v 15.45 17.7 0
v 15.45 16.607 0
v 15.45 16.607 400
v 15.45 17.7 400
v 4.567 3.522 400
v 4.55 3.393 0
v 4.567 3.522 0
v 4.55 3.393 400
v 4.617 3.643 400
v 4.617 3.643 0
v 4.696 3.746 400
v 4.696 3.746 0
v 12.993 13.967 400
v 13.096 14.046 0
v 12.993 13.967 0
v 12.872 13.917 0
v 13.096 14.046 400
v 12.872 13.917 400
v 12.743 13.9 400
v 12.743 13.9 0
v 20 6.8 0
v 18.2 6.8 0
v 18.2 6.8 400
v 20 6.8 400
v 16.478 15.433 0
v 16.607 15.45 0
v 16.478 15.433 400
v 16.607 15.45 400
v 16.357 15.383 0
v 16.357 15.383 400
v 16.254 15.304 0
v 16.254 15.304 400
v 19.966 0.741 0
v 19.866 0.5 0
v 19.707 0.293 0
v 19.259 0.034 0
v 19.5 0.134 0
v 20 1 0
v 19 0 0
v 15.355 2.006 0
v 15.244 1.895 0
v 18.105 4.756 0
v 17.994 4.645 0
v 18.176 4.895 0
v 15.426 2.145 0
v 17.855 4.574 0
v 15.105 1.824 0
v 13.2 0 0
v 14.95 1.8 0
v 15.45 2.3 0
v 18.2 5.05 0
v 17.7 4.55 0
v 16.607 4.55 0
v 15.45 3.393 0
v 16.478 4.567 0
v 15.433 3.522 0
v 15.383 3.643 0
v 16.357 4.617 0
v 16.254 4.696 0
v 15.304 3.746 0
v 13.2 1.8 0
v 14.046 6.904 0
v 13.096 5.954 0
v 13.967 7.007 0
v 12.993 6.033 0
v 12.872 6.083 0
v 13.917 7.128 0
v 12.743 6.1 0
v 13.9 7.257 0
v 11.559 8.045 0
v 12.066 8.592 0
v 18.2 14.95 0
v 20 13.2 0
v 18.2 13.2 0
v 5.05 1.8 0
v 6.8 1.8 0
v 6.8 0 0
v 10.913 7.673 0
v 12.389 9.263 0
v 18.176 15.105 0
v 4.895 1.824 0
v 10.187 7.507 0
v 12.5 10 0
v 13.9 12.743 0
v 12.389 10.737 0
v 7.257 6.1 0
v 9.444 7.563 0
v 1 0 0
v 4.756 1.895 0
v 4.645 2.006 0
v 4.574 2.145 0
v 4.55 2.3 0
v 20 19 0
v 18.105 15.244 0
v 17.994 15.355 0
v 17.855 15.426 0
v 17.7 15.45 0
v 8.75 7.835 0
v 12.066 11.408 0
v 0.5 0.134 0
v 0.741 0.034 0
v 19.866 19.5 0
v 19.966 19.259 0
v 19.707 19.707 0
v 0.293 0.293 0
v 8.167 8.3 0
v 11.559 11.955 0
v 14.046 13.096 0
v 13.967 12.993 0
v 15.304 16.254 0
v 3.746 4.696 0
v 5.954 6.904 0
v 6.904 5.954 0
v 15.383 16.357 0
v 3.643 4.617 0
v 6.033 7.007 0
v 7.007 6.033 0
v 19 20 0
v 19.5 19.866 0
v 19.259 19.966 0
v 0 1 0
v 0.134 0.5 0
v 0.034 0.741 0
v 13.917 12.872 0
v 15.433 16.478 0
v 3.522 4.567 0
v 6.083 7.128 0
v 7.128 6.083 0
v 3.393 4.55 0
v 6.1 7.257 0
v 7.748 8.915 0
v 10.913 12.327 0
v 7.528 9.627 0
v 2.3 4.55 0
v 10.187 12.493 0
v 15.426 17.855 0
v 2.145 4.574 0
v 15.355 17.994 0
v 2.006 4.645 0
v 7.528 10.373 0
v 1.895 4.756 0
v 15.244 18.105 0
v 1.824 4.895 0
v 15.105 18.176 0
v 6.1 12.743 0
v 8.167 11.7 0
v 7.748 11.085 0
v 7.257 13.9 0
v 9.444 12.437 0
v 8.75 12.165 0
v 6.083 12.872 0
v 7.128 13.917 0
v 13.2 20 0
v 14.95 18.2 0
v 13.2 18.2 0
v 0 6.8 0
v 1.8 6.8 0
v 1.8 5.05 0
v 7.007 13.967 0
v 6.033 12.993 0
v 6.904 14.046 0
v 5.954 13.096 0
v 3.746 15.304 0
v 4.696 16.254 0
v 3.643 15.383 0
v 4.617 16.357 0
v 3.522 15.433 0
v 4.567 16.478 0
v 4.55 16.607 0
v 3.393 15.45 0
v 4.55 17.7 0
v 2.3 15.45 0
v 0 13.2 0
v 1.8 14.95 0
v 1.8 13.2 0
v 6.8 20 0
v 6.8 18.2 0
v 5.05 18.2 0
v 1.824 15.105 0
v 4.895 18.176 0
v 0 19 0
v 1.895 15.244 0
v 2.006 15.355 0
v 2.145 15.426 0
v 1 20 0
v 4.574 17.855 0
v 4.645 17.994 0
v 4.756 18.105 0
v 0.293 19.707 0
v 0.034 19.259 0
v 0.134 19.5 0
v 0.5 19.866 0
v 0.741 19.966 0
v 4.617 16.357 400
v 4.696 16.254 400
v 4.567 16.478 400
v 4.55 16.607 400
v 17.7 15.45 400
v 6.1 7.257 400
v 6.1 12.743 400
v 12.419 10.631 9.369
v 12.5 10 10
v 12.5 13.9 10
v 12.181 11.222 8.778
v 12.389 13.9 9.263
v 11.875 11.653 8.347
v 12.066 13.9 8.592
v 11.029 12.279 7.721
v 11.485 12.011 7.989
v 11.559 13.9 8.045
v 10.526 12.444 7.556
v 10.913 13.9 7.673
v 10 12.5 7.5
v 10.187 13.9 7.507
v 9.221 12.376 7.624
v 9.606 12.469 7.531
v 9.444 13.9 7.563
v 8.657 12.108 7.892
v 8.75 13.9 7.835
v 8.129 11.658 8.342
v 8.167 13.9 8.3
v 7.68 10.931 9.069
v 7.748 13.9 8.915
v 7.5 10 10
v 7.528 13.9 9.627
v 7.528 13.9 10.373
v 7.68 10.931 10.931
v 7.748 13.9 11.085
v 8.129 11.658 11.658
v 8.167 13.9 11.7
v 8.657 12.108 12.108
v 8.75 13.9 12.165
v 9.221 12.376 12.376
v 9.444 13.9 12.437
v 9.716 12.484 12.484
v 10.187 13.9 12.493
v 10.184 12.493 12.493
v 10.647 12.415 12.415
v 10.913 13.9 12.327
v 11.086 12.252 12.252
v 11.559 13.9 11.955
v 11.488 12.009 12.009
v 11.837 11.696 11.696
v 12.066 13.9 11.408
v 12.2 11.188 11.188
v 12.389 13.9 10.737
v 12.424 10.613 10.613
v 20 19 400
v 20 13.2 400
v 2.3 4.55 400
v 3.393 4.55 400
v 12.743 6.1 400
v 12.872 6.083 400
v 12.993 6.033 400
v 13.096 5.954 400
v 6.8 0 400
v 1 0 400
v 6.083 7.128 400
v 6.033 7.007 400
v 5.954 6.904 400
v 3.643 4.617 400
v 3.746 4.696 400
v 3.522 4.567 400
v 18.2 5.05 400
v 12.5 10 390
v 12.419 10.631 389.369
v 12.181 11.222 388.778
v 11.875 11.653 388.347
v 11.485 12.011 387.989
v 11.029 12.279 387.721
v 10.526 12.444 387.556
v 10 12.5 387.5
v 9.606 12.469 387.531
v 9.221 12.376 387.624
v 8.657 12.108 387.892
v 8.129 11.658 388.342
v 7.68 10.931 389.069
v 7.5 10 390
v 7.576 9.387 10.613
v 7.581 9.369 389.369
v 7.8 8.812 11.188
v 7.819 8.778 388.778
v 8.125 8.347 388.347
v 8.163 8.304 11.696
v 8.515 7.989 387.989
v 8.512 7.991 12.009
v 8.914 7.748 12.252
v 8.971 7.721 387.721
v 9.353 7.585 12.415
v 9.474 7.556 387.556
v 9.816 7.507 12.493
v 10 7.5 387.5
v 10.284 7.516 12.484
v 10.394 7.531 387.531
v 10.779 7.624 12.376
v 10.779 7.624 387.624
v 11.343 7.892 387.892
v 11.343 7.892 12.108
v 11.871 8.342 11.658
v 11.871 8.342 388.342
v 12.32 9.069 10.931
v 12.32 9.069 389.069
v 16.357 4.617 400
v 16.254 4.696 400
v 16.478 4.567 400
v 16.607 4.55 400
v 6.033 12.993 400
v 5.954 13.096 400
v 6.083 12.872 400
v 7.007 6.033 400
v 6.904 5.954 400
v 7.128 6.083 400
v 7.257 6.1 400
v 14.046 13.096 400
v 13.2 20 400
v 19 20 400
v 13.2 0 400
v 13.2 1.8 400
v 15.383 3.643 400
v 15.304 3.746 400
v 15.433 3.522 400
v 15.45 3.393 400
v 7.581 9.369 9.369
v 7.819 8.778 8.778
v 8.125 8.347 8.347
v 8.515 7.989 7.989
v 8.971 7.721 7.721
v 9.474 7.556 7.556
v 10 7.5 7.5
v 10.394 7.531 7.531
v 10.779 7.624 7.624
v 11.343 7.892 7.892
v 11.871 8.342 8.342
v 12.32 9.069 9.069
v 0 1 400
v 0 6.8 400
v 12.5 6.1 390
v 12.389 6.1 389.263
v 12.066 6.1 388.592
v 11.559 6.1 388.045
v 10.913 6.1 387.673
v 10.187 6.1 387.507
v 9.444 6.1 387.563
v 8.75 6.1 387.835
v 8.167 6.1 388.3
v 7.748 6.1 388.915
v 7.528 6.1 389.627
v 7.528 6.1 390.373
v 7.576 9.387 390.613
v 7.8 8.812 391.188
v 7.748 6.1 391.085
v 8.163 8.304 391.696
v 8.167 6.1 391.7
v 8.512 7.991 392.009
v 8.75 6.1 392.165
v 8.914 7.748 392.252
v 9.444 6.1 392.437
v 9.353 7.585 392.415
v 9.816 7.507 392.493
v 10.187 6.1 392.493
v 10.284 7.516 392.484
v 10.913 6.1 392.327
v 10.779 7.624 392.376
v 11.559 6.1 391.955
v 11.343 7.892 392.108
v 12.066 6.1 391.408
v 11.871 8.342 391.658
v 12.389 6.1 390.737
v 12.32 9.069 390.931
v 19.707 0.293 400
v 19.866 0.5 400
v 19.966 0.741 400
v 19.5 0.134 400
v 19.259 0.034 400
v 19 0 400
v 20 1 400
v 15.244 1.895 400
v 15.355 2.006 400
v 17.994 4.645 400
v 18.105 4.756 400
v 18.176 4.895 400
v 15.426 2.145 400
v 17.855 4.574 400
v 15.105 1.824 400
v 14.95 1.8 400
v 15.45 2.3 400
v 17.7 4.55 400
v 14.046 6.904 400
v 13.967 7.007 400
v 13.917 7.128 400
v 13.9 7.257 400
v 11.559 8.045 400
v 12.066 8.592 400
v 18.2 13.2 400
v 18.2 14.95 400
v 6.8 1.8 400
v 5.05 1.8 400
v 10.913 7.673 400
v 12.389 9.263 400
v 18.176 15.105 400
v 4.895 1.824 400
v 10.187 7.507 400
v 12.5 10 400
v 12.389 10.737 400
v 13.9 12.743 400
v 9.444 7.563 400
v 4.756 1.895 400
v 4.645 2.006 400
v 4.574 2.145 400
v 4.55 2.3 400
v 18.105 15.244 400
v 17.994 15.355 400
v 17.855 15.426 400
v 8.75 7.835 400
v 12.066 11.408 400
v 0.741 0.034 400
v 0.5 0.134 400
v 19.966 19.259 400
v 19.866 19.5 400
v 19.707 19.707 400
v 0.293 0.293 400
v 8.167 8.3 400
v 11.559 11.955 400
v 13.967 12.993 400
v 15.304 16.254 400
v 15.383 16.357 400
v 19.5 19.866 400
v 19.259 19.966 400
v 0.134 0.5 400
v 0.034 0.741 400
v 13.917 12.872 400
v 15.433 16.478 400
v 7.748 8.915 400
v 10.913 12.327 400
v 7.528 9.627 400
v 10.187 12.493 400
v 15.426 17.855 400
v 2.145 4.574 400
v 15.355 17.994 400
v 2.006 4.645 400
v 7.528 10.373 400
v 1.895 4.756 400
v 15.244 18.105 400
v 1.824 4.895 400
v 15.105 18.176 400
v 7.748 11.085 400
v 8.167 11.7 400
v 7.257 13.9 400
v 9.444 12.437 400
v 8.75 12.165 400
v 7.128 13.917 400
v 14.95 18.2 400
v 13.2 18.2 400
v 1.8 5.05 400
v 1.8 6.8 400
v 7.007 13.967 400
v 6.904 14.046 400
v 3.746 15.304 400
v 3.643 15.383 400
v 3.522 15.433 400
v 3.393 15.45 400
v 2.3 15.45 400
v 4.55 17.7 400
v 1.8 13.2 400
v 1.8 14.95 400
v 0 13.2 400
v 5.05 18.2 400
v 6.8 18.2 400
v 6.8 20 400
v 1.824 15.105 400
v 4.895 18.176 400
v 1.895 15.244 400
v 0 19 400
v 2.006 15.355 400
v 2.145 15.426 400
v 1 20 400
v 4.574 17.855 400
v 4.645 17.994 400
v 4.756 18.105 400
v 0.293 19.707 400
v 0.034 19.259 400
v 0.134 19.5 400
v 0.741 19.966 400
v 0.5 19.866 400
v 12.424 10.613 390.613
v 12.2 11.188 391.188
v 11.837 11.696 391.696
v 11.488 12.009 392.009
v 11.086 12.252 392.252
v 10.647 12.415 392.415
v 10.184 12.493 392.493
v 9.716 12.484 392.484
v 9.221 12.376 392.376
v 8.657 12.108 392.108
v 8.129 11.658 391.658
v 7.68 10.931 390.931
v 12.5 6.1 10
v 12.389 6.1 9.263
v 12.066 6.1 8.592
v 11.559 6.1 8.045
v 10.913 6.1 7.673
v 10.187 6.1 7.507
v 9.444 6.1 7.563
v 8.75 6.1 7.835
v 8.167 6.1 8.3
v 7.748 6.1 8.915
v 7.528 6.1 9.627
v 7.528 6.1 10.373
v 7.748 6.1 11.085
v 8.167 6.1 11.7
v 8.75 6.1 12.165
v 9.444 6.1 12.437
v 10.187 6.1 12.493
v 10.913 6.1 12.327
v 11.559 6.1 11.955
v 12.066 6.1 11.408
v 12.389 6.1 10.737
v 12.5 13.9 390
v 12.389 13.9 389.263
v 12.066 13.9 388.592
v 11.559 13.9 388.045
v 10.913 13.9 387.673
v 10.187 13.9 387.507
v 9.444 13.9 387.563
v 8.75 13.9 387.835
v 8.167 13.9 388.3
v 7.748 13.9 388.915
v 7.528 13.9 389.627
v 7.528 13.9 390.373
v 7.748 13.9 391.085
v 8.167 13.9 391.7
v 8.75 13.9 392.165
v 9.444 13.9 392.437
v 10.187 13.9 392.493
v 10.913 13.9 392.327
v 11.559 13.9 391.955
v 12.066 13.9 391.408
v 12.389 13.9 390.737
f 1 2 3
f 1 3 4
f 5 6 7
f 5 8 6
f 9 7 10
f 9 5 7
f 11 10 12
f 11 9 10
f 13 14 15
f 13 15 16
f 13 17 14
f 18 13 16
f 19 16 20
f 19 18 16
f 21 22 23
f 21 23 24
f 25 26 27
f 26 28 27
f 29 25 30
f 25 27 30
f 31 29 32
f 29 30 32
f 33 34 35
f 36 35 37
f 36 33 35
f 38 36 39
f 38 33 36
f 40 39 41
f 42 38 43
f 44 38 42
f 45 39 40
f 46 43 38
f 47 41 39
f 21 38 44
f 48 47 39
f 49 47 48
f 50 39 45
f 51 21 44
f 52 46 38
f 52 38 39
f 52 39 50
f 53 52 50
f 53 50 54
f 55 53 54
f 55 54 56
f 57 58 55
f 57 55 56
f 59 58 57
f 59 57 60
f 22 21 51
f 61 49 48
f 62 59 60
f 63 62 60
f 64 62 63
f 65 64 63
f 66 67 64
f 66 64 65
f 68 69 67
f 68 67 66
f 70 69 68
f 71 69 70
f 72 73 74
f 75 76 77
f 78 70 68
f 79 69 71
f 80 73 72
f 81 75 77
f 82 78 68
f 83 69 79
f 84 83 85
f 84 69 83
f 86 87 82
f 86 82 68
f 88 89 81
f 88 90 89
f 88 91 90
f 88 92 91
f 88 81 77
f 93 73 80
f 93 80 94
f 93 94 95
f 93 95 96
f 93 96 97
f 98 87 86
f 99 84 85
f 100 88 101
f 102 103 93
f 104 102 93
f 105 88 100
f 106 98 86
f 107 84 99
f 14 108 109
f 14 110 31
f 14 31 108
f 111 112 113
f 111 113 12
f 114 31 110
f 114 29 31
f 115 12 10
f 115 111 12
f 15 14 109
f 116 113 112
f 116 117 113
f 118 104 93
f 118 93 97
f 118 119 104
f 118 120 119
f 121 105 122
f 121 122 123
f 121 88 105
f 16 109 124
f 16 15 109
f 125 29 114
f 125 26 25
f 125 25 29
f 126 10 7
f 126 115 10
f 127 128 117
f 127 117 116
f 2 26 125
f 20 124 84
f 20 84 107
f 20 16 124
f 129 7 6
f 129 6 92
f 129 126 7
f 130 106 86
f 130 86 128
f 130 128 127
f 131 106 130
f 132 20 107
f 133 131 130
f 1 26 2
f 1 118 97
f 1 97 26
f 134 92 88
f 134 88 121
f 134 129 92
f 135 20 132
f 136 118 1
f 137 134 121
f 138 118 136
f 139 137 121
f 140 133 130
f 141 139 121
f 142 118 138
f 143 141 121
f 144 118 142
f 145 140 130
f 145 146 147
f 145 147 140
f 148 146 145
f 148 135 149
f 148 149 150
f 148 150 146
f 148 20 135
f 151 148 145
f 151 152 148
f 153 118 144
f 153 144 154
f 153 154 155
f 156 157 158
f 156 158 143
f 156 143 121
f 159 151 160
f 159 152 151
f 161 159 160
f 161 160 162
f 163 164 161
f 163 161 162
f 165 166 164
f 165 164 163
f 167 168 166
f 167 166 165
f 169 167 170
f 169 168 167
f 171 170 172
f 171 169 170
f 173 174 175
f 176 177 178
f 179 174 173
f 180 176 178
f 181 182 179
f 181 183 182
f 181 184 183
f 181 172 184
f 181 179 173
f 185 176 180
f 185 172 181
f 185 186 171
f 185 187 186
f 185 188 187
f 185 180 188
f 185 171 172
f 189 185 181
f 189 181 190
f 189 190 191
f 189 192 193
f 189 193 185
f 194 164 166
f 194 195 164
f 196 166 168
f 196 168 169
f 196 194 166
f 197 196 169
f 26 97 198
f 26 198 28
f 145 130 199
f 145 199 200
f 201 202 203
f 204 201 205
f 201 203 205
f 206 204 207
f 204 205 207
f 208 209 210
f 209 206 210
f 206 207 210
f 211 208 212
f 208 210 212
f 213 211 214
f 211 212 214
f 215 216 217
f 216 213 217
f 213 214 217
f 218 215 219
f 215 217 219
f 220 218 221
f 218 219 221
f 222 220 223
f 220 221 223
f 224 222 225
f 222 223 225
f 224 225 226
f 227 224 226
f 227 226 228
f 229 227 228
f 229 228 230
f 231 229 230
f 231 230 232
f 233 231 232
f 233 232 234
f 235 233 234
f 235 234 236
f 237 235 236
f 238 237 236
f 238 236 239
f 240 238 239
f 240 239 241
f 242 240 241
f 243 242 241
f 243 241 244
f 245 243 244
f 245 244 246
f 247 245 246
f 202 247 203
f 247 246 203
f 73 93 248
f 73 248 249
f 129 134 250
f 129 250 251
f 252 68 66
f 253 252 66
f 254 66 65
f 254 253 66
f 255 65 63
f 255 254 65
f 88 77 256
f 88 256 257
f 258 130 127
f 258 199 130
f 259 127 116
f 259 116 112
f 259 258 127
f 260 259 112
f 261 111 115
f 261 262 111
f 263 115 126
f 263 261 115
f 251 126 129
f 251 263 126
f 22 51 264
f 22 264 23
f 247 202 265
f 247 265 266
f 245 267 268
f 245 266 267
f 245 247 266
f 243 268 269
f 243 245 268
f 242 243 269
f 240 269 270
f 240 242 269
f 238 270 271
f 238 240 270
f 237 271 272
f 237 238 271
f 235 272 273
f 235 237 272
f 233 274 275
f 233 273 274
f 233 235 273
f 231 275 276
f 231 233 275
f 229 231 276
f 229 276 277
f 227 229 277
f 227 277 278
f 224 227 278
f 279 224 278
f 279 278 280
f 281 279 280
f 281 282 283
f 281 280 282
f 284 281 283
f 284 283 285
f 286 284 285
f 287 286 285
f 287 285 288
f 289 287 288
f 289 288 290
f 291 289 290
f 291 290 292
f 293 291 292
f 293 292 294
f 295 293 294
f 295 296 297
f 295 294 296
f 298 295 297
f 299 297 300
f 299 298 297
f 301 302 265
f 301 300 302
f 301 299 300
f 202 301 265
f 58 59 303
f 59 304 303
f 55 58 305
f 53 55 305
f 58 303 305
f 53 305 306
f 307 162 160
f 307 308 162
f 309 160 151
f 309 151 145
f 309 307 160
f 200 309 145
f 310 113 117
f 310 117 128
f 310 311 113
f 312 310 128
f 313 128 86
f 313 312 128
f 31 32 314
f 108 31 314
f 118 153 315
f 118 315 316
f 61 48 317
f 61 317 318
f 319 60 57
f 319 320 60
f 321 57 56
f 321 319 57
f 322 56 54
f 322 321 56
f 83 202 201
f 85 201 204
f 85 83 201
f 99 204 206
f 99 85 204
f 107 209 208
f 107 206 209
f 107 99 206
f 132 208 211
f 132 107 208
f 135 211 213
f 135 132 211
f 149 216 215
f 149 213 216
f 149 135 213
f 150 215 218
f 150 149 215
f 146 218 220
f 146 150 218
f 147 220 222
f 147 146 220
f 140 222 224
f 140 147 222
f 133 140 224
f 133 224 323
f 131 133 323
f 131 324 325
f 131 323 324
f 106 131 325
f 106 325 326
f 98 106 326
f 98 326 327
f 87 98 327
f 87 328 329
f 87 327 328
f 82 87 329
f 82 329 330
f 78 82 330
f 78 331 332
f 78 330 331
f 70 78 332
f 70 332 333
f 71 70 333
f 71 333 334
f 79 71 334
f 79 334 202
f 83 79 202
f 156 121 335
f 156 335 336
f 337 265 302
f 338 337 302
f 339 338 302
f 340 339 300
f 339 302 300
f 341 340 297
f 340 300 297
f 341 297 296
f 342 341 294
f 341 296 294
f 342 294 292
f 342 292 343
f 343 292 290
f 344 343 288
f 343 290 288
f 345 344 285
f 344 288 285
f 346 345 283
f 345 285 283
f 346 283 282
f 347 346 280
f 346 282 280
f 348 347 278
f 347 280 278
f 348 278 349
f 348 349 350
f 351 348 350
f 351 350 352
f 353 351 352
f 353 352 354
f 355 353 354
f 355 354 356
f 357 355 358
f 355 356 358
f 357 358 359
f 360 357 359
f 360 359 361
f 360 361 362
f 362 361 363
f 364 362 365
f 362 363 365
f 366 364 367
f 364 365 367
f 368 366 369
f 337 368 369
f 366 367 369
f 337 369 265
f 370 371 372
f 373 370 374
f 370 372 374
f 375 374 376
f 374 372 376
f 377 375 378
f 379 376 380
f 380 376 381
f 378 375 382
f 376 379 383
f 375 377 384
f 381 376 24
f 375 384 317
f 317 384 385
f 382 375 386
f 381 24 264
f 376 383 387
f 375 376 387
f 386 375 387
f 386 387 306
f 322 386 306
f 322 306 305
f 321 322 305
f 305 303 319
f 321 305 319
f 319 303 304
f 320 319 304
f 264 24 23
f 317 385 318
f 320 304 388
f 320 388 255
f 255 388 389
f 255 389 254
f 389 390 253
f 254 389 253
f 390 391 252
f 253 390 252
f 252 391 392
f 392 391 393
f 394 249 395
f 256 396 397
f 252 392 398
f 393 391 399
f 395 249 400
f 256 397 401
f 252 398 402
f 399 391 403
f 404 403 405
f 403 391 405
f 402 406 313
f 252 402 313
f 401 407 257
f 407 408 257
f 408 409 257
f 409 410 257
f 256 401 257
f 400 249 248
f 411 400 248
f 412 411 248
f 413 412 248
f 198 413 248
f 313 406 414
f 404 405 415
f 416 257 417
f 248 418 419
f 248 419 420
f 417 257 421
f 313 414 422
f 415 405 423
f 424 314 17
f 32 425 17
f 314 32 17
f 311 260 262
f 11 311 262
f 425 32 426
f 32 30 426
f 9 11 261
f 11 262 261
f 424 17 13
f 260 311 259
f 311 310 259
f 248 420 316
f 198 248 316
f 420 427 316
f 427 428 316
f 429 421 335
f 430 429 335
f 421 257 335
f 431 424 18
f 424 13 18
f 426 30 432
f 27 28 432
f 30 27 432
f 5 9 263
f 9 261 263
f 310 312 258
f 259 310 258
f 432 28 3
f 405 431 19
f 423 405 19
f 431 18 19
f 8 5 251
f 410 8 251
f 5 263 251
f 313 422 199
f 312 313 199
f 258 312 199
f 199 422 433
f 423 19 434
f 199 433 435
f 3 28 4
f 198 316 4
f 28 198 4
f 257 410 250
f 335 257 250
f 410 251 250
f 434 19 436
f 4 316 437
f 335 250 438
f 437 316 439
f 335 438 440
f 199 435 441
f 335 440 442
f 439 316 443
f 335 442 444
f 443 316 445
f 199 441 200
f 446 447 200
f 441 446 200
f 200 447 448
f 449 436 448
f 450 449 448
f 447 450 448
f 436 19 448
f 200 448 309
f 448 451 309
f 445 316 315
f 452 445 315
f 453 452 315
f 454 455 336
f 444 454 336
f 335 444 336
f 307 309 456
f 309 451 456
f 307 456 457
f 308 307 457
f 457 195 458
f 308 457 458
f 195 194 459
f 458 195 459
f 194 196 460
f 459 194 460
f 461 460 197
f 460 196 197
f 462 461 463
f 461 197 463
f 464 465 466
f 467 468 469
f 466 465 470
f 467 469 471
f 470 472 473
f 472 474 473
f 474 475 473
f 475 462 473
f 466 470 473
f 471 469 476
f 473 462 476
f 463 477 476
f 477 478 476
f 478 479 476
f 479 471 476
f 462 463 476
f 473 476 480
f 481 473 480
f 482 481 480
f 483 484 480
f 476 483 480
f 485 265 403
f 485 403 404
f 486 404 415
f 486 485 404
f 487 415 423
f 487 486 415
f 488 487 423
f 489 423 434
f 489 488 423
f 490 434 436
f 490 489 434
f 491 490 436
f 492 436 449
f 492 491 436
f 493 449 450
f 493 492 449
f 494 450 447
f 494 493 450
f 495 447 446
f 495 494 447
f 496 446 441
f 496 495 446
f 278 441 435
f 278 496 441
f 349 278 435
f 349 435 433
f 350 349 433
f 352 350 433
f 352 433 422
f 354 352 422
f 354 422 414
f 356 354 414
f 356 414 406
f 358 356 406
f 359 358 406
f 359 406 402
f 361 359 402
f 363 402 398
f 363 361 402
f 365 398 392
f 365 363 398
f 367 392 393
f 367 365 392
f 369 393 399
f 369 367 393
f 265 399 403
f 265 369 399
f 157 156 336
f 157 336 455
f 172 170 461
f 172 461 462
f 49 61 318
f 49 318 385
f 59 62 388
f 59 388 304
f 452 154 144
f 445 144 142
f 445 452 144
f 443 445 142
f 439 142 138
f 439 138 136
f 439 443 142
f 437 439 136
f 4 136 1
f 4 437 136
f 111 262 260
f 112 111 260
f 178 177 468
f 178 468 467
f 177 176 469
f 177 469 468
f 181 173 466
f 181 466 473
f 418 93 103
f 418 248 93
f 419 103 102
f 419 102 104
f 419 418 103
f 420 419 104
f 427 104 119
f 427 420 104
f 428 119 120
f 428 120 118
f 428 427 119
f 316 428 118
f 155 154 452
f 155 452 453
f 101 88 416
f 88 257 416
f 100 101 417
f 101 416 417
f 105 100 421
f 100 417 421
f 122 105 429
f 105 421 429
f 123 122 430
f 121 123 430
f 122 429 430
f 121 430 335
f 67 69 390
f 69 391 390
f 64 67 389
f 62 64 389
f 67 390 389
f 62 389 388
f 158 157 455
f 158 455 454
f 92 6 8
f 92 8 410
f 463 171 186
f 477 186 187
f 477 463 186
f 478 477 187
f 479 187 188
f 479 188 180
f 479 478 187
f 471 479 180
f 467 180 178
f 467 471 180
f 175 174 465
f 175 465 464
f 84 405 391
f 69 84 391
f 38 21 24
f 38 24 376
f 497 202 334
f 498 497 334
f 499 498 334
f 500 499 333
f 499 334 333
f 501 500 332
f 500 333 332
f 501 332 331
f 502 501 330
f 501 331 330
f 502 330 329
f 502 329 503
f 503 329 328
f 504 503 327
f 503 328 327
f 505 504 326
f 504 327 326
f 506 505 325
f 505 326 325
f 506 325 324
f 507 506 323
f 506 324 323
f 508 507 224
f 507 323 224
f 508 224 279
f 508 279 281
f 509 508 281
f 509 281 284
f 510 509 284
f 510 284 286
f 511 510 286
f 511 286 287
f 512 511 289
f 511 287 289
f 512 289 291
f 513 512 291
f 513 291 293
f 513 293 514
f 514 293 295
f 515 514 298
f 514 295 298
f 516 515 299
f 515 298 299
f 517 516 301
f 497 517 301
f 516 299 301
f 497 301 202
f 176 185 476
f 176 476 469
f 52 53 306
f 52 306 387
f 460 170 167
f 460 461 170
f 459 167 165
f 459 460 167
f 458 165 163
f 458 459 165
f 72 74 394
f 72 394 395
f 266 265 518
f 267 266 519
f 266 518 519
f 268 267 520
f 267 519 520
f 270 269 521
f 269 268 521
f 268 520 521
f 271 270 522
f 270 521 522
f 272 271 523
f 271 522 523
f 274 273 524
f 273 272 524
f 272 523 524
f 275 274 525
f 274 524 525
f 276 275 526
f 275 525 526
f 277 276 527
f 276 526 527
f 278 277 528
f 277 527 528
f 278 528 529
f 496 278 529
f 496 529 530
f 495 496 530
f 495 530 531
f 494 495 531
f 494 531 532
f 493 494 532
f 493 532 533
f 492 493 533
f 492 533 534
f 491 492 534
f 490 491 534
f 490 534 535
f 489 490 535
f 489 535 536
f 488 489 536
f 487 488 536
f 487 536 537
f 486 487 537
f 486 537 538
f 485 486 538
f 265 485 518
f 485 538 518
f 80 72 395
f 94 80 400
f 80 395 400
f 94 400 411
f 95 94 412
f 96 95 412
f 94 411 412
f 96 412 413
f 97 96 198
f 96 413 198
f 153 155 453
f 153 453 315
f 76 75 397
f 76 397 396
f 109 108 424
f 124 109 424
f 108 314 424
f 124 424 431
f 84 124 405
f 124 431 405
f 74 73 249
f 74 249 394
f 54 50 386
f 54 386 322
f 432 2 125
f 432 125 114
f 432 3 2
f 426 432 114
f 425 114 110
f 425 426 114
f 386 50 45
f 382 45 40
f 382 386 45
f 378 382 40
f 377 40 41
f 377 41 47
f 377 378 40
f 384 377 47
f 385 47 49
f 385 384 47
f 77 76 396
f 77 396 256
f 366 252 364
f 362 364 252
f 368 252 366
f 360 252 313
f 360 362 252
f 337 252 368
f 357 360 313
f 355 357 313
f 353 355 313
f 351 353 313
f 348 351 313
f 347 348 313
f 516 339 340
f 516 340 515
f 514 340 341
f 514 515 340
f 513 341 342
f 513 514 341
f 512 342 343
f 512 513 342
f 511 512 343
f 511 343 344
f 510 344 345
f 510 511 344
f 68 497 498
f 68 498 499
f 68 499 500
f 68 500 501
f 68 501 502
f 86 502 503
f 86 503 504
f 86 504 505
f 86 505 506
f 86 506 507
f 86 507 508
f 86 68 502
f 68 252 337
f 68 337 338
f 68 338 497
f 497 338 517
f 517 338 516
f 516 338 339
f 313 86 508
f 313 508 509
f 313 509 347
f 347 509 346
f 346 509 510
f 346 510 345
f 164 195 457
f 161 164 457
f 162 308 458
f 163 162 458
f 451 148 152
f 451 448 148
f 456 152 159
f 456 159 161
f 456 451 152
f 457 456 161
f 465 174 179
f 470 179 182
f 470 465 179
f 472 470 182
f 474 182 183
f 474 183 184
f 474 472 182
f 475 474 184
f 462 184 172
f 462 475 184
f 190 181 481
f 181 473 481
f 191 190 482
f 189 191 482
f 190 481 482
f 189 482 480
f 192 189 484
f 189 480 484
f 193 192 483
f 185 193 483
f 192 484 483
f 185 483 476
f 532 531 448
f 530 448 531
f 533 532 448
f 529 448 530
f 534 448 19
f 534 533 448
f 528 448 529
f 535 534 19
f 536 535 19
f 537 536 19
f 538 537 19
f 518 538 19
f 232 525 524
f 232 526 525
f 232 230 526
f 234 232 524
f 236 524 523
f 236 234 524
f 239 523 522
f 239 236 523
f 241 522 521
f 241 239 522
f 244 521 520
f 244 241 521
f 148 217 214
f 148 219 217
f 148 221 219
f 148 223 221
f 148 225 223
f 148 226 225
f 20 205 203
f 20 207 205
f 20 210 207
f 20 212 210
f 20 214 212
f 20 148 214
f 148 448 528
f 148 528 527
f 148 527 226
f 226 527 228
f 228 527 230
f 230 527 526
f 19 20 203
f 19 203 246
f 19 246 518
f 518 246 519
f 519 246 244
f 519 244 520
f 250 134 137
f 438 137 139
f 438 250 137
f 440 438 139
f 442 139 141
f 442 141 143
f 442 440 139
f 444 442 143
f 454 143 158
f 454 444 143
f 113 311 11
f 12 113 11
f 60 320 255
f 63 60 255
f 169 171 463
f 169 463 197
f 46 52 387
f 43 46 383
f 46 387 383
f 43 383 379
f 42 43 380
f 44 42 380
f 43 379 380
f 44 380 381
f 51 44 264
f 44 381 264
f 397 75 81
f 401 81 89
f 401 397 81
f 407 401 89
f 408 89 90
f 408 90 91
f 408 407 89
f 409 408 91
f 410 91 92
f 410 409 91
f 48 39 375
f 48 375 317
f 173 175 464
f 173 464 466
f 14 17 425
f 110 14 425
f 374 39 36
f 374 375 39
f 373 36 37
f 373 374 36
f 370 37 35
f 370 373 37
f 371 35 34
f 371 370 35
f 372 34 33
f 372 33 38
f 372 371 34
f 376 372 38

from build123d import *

# Parameters (mm, degrees)
SKETCH1_R           = 2.5
BOSS_EXTRUDE1_DEPTH = 400
FILLET1_R           = 1
FILLET2_R           = 0.5
FILLET3_R           = 0.5
FILLET4_R           = 0.5
FILLET5_R           = 0.5
CUT_EXTRUDE1_REACH  = 403.218
SKETCH2_R           = 2.5


with BuildPart() as part:
    # Sketch1 → Boss-Extrude1 (new body)
    with BuildSketch(Plane.XY):
        Polygon((13.2, 0), (13.2, 1.8), (15.45, 1.8), (15.45, 3.6), (12.95, 6.1), (7.05, 6.1), (4.55, 3.6), (4.55, 1.8), (6.8, 1.8), (6.8, 0), (0, 0), (0, 6.8), (1.8, 6.8), (1.8, 4.55), (3.6, 4.55), (6.1, 7.05), (6.1, 12.95), (3.6, 15.45), (1.8, 15.45), (1.8, 13.2), (0, 13.2), (0, 20), (6.8, 20), (6.8, 18.2), (4.55, 18.2), (4.55, 16.4), (7.05, 13.9), (12.95, 13.9), (15.45, 16.4), (15.45, 18.2), (13.2, 18.2), (13.2, 20), (20, 20), (20, 13.2), (18.2, 13.2), (18.2, 15.45), (16.4, 15.45), (13.9, 12.95), (13.9, 7.05), (16.4, 4.55), (18.2, 4.55), (18.2, 6.8), (20, 6.8), (20, 0), align=None)
        with Locations((10, 10)):
            Circle(SKETCH1_R, mode=Mode.SUBTRACT)
    extrude(amount=BOSS_EXTRUDE1_DEPTH)

    # Fillet1
    fillet1_edges = [part.edges().sort_by_distance(p)[0] for p in [
        (0, 0, 200),
        (0, 20, 200),
        (20, 20, 200),
        (20, 0, 200),
    ]]
    fillet(fillet1_edges, radius=FILLET1_R)

    # Fillet2
    fillet2_edges = [part.edges().sort_by_distance(p)[0] for p in [
        (4.55, 18.2, 200),
        (4.55, 16.4, 200),
        (7.05, 13.9, 200),
        (12.95, 13.9, 200),
        (15.45, 16.4, 200),
        (15.45, 18.2, 200),
    ]]
    fillet(fillet2_edges, radius=FILLET2_R)

    # Fillet3
    fillet3_edges = [part.edges().sort_by_distance(p)[0] for p in [
        (18.2, 15.45, 200),
        (16.4, 15.45, 200),
        (13.9, 12.95, 200),
        (13.9, 7.05, 200),
        (16.4, 4.55, 200),
        (18.2, 4.55, 200),
    ]]
    fillet(fillet3_edges, radius=FILLET3_R)

    # Fillet4
    fillet4_edges = [part.edges().sort_by_distance(p)[0] for p in [
        (1.8, 4.55, 200),
        (3.6, 4.55, 200),
        (6.1, 7.05, 200),
        (6.1, 12.95, 200),
        (3.6, 15.45, 200),
        (1.8, 15.45, 200),
    ]]
    fillet(fillet4_edges, radius=FILLET4_R)

    # Fillet5
    fillet5_edges = [part.edges().sort_by_distance(p)[0] for p in [
        (15.45, 1.8, 200),
        (15.45, 3.6, 200),
        (12.95, 6.1, 200),
        (7.05, 6.1, 200),
        (4.55, 3.6, 200),
        (4.55, 1.8, 200),
    ]]
    fillet(fillet5_edges, radius=FILLET5_R)

    # Cut-Extrude1: up to this face of the body (flat: up to its plane)
    cut_extrude1_end = Plane(part.part.faces().sort_by_distance((10, 6.1, 200))[0])
    # Sketch2 → Cut-Extrude1 (cut, up to the picked face)
    with BuildSketch(Plane(origin=(0, 24, 0), x_dir=(1, 0, 0), z_dir=(0, 1, 0)), mode=Mode.PRIVATE) as cut_extrude1_sk1:
        with Locations((10, -10)):
            Circle(SKETCH2_R)
    cut_extrude1_tool1 = split(extrude(cut_extrude1_sk1.sketch, amount=-CUT_EXTRUDE1_REACH, mode=Mode.PRIVATE), bisect_by=cut_extrude1_end, keep=Keep.BOTH, mode=Mode.PRIVATE)
    # Sketch2 → Cut-Extrude1 (cut, up to the picked face)
    with BuildSketch(Plane(origin=(0, 24, 0), x_dir=(1, 0, 0), z_dir=(0, 1, 0)), mode=Mode.PRIVATE) as cut_extrude1_sk2:
        with Locations((10, -390)):
            Circle(SKETCH2_R)
    cut_extrude1_tool2 = split(extrude(cut_extrude1_sk2.sketch, amount=-CUT_EXTRUDE1_REACH, mode=Mode.PRIVATE), bisect_by=cut_extrude1_end, keep=Keep.BOTH, mode=Mode.PRIVATE)
    add(cut_extrude1_tool1.solids().sort_by(Axis((10, 24, 10), (0, -1, 0)))[0], mode=Mode.SUBTRACT)
    add(cut_extrude1_tool2.solids().sort_by(Axis((10, 24, 390), (0, -1, 0)))[0], mode=Mode.SUBTRACT)


solid = part.part
